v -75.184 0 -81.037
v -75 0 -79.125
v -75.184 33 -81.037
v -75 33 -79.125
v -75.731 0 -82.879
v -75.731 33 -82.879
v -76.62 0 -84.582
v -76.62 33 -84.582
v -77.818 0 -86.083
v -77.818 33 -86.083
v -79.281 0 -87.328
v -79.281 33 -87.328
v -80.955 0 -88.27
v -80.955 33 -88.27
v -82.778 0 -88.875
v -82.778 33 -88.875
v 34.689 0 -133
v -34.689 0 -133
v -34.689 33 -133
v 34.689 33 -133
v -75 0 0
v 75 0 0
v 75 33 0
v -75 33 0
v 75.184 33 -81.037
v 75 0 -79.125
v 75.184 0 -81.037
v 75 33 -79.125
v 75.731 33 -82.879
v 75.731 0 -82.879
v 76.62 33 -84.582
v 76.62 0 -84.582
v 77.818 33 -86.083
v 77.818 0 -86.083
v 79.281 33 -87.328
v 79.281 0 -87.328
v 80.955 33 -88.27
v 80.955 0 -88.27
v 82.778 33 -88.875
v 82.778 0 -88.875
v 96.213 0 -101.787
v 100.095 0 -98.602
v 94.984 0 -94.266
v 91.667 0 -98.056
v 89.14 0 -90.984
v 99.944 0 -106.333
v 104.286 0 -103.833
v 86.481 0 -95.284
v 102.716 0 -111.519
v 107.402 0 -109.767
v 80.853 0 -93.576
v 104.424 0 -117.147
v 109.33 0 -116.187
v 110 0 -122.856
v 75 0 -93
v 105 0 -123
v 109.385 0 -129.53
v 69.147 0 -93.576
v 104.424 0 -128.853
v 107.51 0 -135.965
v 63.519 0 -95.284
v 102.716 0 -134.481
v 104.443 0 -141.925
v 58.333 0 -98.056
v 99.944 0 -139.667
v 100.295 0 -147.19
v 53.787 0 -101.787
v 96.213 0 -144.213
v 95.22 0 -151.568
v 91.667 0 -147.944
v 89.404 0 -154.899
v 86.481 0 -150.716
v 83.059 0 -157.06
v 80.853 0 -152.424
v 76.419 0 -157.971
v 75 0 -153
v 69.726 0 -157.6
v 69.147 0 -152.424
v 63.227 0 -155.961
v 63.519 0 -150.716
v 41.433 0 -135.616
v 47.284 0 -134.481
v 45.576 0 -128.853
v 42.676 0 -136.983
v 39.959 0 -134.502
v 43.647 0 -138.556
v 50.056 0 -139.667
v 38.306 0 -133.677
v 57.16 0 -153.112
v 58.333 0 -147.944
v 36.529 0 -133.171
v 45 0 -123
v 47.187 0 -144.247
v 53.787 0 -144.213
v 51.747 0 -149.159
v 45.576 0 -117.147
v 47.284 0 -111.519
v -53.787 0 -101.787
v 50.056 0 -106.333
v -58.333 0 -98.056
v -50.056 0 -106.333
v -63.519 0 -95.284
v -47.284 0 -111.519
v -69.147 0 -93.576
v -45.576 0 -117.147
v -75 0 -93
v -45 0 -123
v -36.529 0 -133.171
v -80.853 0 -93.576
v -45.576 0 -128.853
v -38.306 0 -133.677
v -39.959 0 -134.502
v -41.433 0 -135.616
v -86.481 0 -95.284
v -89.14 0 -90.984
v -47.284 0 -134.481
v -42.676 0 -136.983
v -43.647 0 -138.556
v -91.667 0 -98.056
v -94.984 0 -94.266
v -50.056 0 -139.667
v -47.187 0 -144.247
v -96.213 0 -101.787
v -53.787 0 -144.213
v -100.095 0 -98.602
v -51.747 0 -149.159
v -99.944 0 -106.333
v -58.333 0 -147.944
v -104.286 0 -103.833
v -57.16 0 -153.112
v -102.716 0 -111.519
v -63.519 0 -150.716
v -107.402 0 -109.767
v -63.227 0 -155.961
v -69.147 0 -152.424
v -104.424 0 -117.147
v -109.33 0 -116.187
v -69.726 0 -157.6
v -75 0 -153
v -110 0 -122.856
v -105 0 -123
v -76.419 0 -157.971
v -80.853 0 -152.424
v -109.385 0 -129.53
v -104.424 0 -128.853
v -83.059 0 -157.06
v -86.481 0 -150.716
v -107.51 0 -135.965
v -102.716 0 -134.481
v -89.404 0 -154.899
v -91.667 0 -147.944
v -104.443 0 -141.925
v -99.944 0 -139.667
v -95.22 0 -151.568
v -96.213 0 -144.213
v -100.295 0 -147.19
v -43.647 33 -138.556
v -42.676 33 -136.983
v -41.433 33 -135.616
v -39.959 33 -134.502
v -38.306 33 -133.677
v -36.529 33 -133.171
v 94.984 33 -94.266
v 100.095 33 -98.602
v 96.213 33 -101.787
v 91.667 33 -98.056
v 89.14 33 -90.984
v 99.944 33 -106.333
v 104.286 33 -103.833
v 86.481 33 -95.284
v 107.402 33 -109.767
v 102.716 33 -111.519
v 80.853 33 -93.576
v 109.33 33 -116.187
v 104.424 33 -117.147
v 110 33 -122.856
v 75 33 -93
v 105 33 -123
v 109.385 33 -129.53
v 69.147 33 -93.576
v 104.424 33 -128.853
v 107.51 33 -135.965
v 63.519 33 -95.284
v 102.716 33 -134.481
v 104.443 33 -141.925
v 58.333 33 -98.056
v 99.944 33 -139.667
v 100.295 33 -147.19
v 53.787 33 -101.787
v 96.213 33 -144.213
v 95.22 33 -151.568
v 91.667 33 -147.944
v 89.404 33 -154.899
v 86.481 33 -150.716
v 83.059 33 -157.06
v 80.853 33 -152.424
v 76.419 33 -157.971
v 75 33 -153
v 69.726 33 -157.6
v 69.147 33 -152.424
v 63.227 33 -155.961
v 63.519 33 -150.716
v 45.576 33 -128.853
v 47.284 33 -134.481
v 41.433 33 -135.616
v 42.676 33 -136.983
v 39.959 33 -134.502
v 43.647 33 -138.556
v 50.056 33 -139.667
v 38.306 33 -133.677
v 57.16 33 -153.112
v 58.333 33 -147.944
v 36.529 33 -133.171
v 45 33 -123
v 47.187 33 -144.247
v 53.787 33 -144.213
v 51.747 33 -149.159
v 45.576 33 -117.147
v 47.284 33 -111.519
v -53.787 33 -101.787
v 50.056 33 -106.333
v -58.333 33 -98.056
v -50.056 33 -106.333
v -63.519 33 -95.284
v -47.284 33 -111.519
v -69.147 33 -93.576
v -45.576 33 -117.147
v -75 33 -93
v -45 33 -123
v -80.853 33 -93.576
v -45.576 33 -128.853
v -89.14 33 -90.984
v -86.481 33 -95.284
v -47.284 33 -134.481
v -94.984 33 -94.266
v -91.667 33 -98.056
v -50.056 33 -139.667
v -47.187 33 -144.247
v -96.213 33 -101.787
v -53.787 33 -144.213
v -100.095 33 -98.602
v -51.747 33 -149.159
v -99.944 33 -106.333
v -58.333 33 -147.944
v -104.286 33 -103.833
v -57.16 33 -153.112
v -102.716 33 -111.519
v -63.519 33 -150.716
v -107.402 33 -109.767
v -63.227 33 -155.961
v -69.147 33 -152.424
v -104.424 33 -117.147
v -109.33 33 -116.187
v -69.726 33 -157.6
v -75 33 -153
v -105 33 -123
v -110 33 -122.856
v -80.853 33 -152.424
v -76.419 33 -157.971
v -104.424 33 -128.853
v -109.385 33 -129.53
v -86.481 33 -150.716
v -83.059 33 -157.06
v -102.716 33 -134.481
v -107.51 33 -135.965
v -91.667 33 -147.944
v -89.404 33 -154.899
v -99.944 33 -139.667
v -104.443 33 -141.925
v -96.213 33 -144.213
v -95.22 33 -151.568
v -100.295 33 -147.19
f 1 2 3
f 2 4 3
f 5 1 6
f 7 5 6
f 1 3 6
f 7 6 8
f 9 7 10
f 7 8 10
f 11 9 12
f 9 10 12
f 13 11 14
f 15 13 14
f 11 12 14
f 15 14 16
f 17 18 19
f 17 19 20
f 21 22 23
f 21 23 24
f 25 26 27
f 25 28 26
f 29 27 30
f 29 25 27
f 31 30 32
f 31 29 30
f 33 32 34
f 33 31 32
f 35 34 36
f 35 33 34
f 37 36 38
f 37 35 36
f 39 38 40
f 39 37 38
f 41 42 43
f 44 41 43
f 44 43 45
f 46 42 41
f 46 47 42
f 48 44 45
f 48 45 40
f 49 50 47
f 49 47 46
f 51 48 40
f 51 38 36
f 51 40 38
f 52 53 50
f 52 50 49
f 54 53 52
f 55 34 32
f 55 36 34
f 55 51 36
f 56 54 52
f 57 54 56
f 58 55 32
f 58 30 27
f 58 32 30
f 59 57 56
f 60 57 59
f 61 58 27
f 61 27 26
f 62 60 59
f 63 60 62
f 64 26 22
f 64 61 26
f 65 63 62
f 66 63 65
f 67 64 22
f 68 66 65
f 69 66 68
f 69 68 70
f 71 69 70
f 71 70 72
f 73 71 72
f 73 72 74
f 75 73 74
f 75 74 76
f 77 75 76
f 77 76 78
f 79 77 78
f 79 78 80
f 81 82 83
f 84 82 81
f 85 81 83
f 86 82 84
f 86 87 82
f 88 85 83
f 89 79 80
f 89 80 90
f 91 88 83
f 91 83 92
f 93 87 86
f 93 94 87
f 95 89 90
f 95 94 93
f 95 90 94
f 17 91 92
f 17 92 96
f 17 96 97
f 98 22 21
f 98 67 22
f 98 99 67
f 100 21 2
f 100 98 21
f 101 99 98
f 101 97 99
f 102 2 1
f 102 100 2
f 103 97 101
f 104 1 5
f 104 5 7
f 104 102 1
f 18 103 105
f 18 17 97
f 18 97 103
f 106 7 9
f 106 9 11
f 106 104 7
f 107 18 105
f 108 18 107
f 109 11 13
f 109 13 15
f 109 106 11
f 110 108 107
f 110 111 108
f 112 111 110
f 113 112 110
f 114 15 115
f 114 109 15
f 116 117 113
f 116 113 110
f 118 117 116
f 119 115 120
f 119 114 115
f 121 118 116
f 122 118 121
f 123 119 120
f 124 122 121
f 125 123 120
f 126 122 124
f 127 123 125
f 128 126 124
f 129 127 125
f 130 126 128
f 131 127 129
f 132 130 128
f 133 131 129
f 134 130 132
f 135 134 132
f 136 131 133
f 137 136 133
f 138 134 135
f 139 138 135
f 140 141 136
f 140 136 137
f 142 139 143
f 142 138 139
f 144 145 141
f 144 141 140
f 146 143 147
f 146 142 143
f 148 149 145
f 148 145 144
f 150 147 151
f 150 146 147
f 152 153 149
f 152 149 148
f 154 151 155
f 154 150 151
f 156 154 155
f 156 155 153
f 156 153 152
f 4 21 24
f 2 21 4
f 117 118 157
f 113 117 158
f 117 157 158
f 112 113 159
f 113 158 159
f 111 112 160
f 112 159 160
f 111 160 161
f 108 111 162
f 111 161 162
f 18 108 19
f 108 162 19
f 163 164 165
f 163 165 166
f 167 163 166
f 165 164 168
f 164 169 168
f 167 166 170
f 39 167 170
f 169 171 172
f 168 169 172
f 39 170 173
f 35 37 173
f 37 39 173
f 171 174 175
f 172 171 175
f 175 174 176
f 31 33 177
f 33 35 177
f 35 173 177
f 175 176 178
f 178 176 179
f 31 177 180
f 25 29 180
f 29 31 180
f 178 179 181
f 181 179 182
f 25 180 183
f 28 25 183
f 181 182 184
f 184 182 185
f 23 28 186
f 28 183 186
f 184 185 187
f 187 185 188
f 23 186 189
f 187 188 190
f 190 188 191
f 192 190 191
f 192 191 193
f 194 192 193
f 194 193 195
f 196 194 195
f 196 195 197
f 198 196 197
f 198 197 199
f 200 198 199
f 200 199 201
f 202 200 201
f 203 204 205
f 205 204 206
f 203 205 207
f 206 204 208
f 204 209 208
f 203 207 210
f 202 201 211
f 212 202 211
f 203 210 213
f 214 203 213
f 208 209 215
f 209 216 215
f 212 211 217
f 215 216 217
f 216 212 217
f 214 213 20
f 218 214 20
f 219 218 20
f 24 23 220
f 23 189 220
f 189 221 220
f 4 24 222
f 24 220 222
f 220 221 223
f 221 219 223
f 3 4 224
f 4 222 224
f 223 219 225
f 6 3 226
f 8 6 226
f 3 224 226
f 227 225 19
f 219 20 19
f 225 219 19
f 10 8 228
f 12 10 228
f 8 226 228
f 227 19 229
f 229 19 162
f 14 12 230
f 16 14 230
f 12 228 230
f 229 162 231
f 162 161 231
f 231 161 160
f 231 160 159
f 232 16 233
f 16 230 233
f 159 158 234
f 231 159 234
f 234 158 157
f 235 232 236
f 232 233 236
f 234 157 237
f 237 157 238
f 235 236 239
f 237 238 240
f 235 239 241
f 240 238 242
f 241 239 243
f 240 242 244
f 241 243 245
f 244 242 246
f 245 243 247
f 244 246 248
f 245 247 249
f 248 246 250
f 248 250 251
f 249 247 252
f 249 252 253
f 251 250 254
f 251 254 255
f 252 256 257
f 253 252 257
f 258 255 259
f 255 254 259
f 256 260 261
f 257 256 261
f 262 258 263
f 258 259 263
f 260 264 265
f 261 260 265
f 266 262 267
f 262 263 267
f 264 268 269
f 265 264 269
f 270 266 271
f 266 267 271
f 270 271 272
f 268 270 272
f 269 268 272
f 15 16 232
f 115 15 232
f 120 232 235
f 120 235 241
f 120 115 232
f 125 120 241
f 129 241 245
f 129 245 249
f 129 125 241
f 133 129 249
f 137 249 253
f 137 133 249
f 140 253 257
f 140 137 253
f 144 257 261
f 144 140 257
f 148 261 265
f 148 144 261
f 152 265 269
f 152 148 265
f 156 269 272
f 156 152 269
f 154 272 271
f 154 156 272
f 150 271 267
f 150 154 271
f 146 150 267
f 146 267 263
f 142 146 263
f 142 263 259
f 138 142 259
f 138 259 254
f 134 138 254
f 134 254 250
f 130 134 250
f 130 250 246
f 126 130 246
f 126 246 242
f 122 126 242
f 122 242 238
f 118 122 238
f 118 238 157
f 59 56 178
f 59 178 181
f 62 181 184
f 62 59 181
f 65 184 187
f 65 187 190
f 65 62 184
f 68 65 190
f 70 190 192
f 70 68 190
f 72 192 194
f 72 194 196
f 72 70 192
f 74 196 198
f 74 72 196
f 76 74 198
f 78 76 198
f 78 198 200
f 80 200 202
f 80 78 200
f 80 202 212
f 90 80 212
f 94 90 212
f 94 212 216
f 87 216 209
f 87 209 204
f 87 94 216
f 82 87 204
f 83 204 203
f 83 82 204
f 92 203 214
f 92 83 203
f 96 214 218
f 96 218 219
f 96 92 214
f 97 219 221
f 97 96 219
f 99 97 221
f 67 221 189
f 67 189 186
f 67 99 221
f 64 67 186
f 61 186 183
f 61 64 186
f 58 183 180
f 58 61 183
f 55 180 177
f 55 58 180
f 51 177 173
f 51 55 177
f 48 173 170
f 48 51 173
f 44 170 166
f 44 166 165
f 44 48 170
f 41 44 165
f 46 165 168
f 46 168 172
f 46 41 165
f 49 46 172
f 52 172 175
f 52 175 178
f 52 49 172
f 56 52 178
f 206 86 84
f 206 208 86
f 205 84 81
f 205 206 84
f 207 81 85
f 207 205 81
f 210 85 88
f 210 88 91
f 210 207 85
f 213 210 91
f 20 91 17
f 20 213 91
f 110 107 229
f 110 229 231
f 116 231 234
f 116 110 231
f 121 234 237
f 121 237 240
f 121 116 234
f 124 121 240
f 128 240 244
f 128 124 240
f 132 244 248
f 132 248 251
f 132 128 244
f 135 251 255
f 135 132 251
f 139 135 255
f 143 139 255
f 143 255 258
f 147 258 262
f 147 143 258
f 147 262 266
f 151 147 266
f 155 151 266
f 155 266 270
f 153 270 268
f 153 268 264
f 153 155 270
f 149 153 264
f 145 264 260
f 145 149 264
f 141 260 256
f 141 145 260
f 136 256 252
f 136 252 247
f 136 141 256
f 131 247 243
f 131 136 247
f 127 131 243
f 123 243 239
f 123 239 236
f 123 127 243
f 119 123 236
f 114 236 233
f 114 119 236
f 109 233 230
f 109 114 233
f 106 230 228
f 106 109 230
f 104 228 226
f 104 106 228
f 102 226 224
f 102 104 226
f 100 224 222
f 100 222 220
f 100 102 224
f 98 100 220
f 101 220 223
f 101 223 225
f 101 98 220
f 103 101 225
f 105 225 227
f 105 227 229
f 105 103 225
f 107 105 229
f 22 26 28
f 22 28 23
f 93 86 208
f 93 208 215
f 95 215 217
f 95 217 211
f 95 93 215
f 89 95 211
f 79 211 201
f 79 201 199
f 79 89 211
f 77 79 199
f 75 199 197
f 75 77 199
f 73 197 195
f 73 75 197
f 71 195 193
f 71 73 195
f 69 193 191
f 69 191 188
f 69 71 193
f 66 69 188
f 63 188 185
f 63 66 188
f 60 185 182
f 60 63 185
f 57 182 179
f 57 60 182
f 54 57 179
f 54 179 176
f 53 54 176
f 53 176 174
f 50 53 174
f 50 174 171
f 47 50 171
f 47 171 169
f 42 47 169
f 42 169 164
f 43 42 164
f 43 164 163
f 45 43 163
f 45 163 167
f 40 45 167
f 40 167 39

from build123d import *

# Parameters (mm, degrees)
SKETCH1_R           = 30
BOSS_EXTRUDE1_DEPTH = 33
FILLET1_R           = 10


with BuildPart() as part:
    # Sketch1 → Boss-Extrude1 (new body)
    with BuildSketch(Plane(origin=(0, 0, 0), x_dir=(1, 0, 0), z_dir=(0, 1, 0))):
        with BuildLine():
            Line((75, 0), (-75, 0))
            Line((-75, 0), (-75, 88))
            ThreePointArc((-75, 88), (-103.062430401, 143.916500663), (-41.458980338, 133))
            Line((-41.458980338, 133), (41.458980338, 133))
            ThreePointArc((41.458980338, 133), (103.062430401, 143.916500663), (75, 88))
            Line((75, 88), (75, 0))
        make_face()
        with Locations((-75, 123)):
            Circle(SKETCH1_R, mode=Mode.SUBTRACT)
        with Locations((75, 123)):
            Circle(SKETCH1_R, mode=Mode.SUBTRACT)
    extrude(amount=BOSS_EXTRUDE1_DEPTH)

    # Fillet1
    fillet1_edges = [part.edges().sort_by_distance(p)[0] for p in [
        (-75, 16.5, -88),
        (-41.458980338, 16.5, -133),
        (41.458980338, 16.5, -133),
        (75, 16.5, -88),
    ]]
    fillet(fillet1_edges, radius=FILLET1_R)


solid = part.part
